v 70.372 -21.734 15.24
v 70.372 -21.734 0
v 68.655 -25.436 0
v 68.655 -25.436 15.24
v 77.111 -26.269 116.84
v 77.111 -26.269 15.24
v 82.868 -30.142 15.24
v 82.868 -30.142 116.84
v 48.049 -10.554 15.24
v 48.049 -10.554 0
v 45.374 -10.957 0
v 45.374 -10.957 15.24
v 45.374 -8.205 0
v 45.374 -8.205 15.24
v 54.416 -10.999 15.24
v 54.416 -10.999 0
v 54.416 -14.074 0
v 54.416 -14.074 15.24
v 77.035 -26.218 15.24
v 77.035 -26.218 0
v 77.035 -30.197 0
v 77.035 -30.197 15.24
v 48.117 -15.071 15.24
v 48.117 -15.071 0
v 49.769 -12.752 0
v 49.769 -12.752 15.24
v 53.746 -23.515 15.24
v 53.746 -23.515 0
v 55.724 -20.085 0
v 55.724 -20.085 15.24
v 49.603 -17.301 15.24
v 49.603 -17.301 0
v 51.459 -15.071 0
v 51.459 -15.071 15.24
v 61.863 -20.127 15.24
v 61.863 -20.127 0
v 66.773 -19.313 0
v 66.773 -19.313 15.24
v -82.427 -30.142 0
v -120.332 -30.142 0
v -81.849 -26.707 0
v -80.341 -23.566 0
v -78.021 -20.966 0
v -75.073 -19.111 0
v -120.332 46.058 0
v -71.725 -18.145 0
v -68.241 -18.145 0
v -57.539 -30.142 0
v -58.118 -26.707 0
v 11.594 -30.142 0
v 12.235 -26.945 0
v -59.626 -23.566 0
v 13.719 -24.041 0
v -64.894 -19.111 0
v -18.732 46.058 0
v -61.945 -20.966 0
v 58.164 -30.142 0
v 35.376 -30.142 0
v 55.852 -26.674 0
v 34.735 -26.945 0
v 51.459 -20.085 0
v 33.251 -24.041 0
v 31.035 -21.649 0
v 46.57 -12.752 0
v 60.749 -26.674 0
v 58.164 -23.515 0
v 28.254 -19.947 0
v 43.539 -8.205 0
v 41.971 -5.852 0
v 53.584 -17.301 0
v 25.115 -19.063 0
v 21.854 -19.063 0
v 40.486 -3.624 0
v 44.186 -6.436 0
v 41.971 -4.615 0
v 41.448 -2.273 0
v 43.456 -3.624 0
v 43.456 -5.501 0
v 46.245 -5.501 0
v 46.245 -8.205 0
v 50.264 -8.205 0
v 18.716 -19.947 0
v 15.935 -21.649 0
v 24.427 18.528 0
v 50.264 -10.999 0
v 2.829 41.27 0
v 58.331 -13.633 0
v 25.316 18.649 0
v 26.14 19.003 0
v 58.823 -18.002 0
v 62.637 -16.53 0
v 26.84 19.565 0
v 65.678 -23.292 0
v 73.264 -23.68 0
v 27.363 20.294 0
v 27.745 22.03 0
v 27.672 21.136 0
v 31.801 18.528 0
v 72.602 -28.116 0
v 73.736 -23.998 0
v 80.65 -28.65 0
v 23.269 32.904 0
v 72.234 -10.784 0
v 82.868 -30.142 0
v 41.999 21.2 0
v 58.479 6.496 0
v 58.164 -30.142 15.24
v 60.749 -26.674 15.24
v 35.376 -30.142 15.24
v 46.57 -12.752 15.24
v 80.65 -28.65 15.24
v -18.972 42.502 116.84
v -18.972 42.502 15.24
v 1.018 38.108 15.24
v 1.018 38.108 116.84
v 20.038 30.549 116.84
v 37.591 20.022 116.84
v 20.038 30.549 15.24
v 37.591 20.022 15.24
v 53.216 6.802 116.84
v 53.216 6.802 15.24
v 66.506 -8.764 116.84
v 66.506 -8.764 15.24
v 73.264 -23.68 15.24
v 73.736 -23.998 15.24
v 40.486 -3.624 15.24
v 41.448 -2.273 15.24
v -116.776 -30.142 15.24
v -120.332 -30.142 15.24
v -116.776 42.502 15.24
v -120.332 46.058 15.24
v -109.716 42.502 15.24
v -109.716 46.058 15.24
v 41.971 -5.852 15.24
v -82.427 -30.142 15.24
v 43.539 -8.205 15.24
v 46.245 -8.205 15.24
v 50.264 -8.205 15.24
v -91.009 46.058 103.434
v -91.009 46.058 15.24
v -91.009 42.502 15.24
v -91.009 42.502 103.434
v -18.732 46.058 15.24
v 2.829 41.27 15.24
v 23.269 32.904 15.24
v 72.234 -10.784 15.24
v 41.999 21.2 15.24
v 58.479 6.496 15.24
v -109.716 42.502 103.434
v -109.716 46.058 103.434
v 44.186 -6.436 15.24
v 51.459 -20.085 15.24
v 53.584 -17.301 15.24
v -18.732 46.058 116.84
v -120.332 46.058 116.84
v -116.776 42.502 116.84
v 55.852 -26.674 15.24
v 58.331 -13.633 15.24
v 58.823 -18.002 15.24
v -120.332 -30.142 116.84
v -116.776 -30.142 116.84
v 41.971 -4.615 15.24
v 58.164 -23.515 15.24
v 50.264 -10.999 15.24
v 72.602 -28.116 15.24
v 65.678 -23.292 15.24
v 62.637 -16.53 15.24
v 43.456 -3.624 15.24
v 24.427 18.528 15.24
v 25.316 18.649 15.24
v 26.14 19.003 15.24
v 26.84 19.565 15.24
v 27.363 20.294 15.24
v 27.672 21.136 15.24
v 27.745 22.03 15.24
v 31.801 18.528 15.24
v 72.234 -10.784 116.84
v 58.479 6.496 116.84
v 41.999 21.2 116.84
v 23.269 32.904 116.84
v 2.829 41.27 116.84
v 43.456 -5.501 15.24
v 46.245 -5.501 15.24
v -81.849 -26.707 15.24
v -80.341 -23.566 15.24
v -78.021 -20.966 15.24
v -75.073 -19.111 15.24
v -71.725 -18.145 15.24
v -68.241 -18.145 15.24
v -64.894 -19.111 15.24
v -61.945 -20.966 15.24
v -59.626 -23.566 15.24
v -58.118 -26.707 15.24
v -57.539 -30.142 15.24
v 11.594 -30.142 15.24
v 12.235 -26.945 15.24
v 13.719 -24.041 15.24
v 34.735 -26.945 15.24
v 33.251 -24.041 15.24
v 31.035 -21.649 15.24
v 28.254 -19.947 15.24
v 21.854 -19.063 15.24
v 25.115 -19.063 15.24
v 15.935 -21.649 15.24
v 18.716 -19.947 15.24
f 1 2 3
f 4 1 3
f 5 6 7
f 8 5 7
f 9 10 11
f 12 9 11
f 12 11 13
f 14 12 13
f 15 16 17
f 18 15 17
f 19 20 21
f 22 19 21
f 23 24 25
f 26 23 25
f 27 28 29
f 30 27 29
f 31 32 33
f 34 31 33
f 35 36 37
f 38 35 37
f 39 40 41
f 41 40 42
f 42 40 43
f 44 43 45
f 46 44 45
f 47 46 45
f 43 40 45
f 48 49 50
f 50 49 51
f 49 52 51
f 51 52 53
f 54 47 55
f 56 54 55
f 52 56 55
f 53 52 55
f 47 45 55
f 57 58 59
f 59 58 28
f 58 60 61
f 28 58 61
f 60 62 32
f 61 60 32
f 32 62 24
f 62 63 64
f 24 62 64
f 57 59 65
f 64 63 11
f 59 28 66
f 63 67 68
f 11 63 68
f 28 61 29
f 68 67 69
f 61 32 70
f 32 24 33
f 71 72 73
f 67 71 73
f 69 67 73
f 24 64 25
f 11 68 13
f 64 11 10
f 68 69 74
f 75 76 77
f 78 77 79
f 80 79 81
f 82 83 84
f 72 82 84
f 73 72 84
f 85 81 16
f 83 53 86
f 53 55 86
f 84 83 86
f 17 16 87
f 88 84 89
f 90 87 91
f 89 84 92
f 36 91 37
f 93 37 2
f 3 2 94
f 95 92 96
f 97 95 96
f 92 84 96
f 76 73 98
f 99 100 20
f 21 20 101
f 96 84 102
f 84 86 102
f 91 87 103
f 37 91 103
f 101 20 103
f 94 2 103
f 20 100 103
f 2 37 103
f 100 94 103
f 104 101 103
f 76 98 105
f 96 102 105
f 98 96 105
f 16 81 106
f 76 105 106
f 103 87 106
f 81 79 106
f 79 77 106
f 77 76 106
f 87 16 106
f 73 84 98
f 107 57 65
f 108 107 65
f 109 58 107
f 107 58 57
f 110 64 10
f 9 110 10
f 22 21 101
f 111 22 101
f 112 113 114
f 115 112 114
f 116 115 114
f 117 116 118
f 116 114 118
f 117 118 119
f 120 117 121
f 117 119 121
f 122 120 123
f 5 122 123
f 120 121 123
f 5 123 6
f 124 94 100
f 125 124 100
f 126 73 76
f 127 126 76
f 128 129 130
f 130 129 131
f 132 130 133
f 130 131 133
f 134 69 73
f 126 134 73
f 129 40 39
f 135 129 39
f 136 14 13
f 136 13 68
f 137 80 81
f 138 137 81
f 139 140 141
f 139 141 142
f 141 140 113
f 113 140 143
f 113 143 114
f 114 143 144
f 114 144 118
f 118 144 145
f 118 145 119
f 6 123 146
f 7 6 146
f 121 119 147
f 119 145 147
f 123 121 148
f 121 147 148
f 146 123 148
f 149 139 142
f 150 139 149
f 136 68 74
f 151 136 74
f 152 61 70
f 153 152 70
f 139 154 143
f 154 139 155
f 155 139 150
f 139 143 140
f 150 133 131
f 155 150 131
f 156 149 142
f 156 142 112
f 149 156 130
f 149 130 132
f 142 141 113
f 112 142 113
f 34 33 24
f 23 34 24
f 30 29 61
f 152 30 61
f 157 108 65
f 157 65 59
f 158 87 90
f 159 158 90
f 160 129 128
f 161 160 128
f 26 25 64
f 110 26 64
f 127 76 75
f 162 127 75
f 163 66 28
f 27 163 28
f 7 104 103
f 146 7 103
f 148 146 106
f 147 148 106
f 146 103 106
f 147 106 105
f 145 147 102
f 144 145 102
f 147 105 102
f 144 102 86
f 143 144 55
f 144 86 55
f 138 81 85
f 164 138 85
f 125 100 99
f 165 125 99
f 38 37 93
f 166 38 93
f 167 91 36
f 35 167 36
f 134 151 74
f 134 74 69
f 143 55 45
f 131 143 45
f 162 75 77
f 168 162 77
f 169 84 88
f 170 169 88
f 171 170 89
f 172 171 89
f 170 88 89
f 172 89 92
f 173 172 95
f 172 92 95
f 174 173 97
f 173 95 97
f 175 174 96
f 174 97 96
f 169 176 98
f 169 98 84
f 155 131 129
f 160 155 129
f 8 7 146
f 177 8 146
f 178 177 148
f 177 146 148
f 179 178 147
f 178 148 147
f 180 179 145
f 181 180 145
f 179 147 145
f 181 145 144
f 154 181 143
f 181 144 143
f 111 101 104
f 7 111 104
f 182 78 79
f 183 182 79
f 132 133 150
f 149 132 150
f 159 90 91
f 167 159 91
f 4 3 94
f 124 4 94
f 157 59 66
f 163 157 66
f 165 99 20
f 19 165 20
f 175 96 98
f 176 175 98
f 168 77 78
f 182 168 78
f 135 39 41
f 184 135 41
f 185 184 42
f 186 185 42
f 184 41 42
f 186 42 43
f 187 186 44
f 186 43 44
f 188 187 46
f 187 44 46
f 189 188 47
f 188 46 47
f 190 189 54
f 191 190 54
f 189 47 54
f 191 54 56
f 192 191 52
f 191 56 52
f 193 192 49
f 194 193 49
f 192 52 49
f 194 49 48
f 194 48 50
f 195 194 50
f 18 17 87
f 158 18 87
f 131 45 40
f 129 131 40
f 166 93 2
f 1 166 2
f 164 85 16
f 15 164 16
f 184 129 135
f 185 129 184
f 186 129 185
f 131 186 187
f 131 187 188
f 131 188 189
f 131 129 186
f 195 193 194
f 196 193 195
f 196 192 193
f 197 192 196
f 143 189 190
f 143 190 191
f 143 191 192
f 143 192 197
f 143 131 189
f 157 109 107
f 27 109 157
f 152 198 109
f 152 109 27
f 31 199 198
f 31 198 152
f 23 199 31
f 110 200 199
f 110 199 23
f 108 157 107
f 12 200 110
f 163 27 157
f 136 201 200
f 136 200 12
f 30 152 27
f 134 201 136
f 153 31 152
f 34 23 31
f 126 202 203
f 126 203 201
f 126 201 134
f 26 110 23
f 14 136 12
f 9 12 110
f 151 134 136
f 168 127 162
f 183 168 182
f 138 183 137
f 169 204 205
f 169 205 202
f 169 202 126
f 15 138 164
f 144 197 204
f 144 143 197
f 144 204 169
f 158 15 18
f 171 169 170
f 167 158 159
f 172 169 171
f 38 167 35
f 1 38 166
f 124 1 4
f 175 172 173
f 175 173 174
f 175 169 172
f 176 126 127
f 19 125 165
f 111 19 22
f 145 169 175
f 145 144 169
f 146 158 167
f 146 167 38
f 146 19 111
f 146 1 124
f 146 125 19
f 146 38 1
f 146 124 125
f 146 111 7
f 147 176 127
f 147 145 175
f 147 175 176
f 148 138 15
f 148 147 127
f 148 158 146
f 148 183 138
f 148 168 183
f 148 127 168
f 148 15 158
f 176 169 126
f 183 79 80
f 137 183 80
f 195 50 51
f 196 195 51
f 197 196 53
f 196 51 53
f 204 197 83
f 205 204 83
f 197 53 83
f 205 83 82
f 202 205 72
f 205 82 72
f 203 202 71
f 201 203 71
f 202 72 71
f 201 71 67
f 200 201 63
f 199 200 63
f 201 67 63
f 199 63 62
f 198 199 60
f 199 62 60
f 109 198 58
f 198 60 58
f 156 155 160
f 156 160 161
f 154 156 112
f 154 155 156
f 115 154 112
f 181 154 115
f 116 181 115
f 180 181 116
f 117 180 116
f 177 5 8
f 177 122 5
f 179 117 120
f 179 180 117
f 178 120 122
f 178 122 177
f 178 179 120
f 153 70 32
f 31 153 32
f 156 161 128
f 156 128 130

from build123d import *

# Parameters (mm, degrees)
F1_DEPTH = 15.24
F3_DEPTH = 101.6
F4_W     = 18.707216
F4_H     = 88.194421
F5_DEPTH = 25.4


with BuildPart() as f1:
    # F0 (on Top) → F1 (new body)
    with BuildSketch(Plane.XY):
        with BuildLine():
            Line((-18.732497, 46.057983), (-120.332497, 46.057983))
            Line((-120.332497, 46.057983), (-120.332497, -30.142017))
            Line((-120.332497, -30.142017), (-82.427092, -30.142017))
            ThreePointArc((-82.427092, -30.142017), (-69.983141, -18.022915), (-57.539191, -30.142017))
            Line((-57.539191, -30.142017), (11.593875, -30.142017))
            ThreePointArc((11.593875, -30.142017), (23.484763, -18.950785), (35.375651, -30.142017))
            Line((35.375651, -30.142017), (58.163952, -30.142017))
            Line((58.163952, -30.142017), (60.748935, -26.673689))
            Line((60.748935, -26.673689), (55.851734, -26.673689))
            Line((55.851734, -26.673689), (58.163952, -23.514647))
            Line((58.163952, -23.514647), (53.745706, -23.514647))
            Line((53.745706, -23.514647), (55.724084, -20.08507))
            Line((55.724084, -20.08507), (51.459321, -20.08507))
            Line((51.459321, -20.08507), (53.583879, -17.30103))
            Line((53.583879, -17.30103), (49.603295, -17.30103))
            Line((49.603295, -17.30103), (51.459321, -15.071008))
            Line((51.459321, -15.071008), (48.116613, -15.071008))
            Line((48.116613, -15.071008), (49.768861, -12.751567))
            Line((49.768861, -12.751567), (46.570319, -12.751567))
            Line((46.570319, -12.751567), (48.049032, -10.553847))
            Line((48.049032, -10.553847), (45.373639, -10.956547))
            Line((45.373639, -10.956547), (45.373639, -8.205302))
            Line((45.373639, -8.205302), (43.539476, -8.205302))
            Line((43.539476, -8.205302), (44.186018, -6.436042))
            Line((44.186018, -6.436042), (41.970773, -5.852248))
            Line((41.970773, -5.852248), (40.485543, -3.624404))
            Line((40.485543, -3.624404), (41.447767, -2.273184))
            Line((41.447767, -2.273184), (41.970773, -4.614557))
            Line((41.970773, -4.614557), (43.456003, -3.624404))
            Line((43.456003, -3.624404), (43.456003, -5.500791))
            Line((43.456003, -5.500791), (46.244762, -5.500791))
            Line((46.244762, -5.500791), (46.244762, -8.205302))
            Line((46.244762, -8.205302), (50.264311, -8.205302))
            Line((50.264311, -8.205302), (50.264311, -10.998937))
            Line((50.264311, -10.998937), (54.41632, -10.998937))
            Line((54.41632, -10.998937), (54.41632, -14.073984))
            Line((54.41632, -14.073984), (58.331016, -13.6329))
            Line((58.331016, -13.6329), (58.823281, -18.001834))
            Line((58.823281, -18.001834), (62.637491, -16.530466))
            Line((62.637491, -16.530466), (61.862964, -20.127285))
            Line((61.862964, -20.127285), (66.772538, -19.312689))
            Line((66.772538, -19.312689), (65.677531, -23.292083))
            Line((65.677531, -23.292083), (70.371771, -21.734395))
            Line((70.371771, -21.734395), (68.654649, -25.435705))
            Line((68.654649, -25.435705), (73.264088, -23.68046))
            Line((73.264088, -23.68046), (73.735579, -23.997698))
            Line((73.735579, -23.997698), (72.602402, -28.115808))
            Line((72.602402, -28.115808), (77.035385, -26.217937))
            Line((77.035385, -26.217937), (77.035385, -30.197294))
            Line((77.035385, -30.197294), (80.649813, -28.649868))
            Line((80.649813, -28.649868), (82.867503, -30.142017))
            ThreePointArc((82.867503, -30.142017), (41.998914, 21.199865), (-18.732497, 46.057983))
        make_face()
        with BuildLine():
            ThreePointArc((24.427019, 18.527661), (26.839532, 19.56536), (27.745401, 22.030404))
            Line((27.745401, 22.030404), (31.801209, 18.527661))
            Line((31.801209, 18.527661), (24.427019, 18.527661))
        make_face(mode=Mode.SUBTRACT)
    extrude(amount=F1_DEPTH)


with BuildPart() as f3:
    # F2 (on face) → F3 (new body)
    with BuildSketch(Plane.XY.offset(15.24)):
        with BuildLine():
            Line((77.111421, -26.269097), (82.867503, -30.142017))
            ThreePointArc((82.867503, -30.142017), (41.998914, 21.199865), (-18.732497, 46.057983))
            Line((-18.732497, 46.057983), (-120.332497, 46.057983))
            Line((-120.332497, 46.057983), (-120.332497, -30.142017))
            Line((-120.332497, -30.142017), (-116.776496, -30.142017))
            Line((-116.776496, -30.142017), (-116.776496, 42.501982))
            Line((-116.776496, 42.501982), (-18.971896, 42.501982))
            ThreePointArc((-18.971896, 42.501982), (37.590841, 20.021643), (77.111421, -26.269097))
        make_face()
    extrude(amount=F3_DEPTH)

    # F4 (on face) → F5 (cut)
    with BuildSketch(Plane(origin=(0, 46.057983, 0), x_dir=(-1, 0, 0), z_dir=(0, 1, 0))):
        with Locations((100.362375, 59.33721)):
            Rectangle(F4_W, F4_H)
    extrude(amount=-F5_DEPTH, mode=Mode.SUBTRACT)


solid = Compound([f1.part, f3.part])
